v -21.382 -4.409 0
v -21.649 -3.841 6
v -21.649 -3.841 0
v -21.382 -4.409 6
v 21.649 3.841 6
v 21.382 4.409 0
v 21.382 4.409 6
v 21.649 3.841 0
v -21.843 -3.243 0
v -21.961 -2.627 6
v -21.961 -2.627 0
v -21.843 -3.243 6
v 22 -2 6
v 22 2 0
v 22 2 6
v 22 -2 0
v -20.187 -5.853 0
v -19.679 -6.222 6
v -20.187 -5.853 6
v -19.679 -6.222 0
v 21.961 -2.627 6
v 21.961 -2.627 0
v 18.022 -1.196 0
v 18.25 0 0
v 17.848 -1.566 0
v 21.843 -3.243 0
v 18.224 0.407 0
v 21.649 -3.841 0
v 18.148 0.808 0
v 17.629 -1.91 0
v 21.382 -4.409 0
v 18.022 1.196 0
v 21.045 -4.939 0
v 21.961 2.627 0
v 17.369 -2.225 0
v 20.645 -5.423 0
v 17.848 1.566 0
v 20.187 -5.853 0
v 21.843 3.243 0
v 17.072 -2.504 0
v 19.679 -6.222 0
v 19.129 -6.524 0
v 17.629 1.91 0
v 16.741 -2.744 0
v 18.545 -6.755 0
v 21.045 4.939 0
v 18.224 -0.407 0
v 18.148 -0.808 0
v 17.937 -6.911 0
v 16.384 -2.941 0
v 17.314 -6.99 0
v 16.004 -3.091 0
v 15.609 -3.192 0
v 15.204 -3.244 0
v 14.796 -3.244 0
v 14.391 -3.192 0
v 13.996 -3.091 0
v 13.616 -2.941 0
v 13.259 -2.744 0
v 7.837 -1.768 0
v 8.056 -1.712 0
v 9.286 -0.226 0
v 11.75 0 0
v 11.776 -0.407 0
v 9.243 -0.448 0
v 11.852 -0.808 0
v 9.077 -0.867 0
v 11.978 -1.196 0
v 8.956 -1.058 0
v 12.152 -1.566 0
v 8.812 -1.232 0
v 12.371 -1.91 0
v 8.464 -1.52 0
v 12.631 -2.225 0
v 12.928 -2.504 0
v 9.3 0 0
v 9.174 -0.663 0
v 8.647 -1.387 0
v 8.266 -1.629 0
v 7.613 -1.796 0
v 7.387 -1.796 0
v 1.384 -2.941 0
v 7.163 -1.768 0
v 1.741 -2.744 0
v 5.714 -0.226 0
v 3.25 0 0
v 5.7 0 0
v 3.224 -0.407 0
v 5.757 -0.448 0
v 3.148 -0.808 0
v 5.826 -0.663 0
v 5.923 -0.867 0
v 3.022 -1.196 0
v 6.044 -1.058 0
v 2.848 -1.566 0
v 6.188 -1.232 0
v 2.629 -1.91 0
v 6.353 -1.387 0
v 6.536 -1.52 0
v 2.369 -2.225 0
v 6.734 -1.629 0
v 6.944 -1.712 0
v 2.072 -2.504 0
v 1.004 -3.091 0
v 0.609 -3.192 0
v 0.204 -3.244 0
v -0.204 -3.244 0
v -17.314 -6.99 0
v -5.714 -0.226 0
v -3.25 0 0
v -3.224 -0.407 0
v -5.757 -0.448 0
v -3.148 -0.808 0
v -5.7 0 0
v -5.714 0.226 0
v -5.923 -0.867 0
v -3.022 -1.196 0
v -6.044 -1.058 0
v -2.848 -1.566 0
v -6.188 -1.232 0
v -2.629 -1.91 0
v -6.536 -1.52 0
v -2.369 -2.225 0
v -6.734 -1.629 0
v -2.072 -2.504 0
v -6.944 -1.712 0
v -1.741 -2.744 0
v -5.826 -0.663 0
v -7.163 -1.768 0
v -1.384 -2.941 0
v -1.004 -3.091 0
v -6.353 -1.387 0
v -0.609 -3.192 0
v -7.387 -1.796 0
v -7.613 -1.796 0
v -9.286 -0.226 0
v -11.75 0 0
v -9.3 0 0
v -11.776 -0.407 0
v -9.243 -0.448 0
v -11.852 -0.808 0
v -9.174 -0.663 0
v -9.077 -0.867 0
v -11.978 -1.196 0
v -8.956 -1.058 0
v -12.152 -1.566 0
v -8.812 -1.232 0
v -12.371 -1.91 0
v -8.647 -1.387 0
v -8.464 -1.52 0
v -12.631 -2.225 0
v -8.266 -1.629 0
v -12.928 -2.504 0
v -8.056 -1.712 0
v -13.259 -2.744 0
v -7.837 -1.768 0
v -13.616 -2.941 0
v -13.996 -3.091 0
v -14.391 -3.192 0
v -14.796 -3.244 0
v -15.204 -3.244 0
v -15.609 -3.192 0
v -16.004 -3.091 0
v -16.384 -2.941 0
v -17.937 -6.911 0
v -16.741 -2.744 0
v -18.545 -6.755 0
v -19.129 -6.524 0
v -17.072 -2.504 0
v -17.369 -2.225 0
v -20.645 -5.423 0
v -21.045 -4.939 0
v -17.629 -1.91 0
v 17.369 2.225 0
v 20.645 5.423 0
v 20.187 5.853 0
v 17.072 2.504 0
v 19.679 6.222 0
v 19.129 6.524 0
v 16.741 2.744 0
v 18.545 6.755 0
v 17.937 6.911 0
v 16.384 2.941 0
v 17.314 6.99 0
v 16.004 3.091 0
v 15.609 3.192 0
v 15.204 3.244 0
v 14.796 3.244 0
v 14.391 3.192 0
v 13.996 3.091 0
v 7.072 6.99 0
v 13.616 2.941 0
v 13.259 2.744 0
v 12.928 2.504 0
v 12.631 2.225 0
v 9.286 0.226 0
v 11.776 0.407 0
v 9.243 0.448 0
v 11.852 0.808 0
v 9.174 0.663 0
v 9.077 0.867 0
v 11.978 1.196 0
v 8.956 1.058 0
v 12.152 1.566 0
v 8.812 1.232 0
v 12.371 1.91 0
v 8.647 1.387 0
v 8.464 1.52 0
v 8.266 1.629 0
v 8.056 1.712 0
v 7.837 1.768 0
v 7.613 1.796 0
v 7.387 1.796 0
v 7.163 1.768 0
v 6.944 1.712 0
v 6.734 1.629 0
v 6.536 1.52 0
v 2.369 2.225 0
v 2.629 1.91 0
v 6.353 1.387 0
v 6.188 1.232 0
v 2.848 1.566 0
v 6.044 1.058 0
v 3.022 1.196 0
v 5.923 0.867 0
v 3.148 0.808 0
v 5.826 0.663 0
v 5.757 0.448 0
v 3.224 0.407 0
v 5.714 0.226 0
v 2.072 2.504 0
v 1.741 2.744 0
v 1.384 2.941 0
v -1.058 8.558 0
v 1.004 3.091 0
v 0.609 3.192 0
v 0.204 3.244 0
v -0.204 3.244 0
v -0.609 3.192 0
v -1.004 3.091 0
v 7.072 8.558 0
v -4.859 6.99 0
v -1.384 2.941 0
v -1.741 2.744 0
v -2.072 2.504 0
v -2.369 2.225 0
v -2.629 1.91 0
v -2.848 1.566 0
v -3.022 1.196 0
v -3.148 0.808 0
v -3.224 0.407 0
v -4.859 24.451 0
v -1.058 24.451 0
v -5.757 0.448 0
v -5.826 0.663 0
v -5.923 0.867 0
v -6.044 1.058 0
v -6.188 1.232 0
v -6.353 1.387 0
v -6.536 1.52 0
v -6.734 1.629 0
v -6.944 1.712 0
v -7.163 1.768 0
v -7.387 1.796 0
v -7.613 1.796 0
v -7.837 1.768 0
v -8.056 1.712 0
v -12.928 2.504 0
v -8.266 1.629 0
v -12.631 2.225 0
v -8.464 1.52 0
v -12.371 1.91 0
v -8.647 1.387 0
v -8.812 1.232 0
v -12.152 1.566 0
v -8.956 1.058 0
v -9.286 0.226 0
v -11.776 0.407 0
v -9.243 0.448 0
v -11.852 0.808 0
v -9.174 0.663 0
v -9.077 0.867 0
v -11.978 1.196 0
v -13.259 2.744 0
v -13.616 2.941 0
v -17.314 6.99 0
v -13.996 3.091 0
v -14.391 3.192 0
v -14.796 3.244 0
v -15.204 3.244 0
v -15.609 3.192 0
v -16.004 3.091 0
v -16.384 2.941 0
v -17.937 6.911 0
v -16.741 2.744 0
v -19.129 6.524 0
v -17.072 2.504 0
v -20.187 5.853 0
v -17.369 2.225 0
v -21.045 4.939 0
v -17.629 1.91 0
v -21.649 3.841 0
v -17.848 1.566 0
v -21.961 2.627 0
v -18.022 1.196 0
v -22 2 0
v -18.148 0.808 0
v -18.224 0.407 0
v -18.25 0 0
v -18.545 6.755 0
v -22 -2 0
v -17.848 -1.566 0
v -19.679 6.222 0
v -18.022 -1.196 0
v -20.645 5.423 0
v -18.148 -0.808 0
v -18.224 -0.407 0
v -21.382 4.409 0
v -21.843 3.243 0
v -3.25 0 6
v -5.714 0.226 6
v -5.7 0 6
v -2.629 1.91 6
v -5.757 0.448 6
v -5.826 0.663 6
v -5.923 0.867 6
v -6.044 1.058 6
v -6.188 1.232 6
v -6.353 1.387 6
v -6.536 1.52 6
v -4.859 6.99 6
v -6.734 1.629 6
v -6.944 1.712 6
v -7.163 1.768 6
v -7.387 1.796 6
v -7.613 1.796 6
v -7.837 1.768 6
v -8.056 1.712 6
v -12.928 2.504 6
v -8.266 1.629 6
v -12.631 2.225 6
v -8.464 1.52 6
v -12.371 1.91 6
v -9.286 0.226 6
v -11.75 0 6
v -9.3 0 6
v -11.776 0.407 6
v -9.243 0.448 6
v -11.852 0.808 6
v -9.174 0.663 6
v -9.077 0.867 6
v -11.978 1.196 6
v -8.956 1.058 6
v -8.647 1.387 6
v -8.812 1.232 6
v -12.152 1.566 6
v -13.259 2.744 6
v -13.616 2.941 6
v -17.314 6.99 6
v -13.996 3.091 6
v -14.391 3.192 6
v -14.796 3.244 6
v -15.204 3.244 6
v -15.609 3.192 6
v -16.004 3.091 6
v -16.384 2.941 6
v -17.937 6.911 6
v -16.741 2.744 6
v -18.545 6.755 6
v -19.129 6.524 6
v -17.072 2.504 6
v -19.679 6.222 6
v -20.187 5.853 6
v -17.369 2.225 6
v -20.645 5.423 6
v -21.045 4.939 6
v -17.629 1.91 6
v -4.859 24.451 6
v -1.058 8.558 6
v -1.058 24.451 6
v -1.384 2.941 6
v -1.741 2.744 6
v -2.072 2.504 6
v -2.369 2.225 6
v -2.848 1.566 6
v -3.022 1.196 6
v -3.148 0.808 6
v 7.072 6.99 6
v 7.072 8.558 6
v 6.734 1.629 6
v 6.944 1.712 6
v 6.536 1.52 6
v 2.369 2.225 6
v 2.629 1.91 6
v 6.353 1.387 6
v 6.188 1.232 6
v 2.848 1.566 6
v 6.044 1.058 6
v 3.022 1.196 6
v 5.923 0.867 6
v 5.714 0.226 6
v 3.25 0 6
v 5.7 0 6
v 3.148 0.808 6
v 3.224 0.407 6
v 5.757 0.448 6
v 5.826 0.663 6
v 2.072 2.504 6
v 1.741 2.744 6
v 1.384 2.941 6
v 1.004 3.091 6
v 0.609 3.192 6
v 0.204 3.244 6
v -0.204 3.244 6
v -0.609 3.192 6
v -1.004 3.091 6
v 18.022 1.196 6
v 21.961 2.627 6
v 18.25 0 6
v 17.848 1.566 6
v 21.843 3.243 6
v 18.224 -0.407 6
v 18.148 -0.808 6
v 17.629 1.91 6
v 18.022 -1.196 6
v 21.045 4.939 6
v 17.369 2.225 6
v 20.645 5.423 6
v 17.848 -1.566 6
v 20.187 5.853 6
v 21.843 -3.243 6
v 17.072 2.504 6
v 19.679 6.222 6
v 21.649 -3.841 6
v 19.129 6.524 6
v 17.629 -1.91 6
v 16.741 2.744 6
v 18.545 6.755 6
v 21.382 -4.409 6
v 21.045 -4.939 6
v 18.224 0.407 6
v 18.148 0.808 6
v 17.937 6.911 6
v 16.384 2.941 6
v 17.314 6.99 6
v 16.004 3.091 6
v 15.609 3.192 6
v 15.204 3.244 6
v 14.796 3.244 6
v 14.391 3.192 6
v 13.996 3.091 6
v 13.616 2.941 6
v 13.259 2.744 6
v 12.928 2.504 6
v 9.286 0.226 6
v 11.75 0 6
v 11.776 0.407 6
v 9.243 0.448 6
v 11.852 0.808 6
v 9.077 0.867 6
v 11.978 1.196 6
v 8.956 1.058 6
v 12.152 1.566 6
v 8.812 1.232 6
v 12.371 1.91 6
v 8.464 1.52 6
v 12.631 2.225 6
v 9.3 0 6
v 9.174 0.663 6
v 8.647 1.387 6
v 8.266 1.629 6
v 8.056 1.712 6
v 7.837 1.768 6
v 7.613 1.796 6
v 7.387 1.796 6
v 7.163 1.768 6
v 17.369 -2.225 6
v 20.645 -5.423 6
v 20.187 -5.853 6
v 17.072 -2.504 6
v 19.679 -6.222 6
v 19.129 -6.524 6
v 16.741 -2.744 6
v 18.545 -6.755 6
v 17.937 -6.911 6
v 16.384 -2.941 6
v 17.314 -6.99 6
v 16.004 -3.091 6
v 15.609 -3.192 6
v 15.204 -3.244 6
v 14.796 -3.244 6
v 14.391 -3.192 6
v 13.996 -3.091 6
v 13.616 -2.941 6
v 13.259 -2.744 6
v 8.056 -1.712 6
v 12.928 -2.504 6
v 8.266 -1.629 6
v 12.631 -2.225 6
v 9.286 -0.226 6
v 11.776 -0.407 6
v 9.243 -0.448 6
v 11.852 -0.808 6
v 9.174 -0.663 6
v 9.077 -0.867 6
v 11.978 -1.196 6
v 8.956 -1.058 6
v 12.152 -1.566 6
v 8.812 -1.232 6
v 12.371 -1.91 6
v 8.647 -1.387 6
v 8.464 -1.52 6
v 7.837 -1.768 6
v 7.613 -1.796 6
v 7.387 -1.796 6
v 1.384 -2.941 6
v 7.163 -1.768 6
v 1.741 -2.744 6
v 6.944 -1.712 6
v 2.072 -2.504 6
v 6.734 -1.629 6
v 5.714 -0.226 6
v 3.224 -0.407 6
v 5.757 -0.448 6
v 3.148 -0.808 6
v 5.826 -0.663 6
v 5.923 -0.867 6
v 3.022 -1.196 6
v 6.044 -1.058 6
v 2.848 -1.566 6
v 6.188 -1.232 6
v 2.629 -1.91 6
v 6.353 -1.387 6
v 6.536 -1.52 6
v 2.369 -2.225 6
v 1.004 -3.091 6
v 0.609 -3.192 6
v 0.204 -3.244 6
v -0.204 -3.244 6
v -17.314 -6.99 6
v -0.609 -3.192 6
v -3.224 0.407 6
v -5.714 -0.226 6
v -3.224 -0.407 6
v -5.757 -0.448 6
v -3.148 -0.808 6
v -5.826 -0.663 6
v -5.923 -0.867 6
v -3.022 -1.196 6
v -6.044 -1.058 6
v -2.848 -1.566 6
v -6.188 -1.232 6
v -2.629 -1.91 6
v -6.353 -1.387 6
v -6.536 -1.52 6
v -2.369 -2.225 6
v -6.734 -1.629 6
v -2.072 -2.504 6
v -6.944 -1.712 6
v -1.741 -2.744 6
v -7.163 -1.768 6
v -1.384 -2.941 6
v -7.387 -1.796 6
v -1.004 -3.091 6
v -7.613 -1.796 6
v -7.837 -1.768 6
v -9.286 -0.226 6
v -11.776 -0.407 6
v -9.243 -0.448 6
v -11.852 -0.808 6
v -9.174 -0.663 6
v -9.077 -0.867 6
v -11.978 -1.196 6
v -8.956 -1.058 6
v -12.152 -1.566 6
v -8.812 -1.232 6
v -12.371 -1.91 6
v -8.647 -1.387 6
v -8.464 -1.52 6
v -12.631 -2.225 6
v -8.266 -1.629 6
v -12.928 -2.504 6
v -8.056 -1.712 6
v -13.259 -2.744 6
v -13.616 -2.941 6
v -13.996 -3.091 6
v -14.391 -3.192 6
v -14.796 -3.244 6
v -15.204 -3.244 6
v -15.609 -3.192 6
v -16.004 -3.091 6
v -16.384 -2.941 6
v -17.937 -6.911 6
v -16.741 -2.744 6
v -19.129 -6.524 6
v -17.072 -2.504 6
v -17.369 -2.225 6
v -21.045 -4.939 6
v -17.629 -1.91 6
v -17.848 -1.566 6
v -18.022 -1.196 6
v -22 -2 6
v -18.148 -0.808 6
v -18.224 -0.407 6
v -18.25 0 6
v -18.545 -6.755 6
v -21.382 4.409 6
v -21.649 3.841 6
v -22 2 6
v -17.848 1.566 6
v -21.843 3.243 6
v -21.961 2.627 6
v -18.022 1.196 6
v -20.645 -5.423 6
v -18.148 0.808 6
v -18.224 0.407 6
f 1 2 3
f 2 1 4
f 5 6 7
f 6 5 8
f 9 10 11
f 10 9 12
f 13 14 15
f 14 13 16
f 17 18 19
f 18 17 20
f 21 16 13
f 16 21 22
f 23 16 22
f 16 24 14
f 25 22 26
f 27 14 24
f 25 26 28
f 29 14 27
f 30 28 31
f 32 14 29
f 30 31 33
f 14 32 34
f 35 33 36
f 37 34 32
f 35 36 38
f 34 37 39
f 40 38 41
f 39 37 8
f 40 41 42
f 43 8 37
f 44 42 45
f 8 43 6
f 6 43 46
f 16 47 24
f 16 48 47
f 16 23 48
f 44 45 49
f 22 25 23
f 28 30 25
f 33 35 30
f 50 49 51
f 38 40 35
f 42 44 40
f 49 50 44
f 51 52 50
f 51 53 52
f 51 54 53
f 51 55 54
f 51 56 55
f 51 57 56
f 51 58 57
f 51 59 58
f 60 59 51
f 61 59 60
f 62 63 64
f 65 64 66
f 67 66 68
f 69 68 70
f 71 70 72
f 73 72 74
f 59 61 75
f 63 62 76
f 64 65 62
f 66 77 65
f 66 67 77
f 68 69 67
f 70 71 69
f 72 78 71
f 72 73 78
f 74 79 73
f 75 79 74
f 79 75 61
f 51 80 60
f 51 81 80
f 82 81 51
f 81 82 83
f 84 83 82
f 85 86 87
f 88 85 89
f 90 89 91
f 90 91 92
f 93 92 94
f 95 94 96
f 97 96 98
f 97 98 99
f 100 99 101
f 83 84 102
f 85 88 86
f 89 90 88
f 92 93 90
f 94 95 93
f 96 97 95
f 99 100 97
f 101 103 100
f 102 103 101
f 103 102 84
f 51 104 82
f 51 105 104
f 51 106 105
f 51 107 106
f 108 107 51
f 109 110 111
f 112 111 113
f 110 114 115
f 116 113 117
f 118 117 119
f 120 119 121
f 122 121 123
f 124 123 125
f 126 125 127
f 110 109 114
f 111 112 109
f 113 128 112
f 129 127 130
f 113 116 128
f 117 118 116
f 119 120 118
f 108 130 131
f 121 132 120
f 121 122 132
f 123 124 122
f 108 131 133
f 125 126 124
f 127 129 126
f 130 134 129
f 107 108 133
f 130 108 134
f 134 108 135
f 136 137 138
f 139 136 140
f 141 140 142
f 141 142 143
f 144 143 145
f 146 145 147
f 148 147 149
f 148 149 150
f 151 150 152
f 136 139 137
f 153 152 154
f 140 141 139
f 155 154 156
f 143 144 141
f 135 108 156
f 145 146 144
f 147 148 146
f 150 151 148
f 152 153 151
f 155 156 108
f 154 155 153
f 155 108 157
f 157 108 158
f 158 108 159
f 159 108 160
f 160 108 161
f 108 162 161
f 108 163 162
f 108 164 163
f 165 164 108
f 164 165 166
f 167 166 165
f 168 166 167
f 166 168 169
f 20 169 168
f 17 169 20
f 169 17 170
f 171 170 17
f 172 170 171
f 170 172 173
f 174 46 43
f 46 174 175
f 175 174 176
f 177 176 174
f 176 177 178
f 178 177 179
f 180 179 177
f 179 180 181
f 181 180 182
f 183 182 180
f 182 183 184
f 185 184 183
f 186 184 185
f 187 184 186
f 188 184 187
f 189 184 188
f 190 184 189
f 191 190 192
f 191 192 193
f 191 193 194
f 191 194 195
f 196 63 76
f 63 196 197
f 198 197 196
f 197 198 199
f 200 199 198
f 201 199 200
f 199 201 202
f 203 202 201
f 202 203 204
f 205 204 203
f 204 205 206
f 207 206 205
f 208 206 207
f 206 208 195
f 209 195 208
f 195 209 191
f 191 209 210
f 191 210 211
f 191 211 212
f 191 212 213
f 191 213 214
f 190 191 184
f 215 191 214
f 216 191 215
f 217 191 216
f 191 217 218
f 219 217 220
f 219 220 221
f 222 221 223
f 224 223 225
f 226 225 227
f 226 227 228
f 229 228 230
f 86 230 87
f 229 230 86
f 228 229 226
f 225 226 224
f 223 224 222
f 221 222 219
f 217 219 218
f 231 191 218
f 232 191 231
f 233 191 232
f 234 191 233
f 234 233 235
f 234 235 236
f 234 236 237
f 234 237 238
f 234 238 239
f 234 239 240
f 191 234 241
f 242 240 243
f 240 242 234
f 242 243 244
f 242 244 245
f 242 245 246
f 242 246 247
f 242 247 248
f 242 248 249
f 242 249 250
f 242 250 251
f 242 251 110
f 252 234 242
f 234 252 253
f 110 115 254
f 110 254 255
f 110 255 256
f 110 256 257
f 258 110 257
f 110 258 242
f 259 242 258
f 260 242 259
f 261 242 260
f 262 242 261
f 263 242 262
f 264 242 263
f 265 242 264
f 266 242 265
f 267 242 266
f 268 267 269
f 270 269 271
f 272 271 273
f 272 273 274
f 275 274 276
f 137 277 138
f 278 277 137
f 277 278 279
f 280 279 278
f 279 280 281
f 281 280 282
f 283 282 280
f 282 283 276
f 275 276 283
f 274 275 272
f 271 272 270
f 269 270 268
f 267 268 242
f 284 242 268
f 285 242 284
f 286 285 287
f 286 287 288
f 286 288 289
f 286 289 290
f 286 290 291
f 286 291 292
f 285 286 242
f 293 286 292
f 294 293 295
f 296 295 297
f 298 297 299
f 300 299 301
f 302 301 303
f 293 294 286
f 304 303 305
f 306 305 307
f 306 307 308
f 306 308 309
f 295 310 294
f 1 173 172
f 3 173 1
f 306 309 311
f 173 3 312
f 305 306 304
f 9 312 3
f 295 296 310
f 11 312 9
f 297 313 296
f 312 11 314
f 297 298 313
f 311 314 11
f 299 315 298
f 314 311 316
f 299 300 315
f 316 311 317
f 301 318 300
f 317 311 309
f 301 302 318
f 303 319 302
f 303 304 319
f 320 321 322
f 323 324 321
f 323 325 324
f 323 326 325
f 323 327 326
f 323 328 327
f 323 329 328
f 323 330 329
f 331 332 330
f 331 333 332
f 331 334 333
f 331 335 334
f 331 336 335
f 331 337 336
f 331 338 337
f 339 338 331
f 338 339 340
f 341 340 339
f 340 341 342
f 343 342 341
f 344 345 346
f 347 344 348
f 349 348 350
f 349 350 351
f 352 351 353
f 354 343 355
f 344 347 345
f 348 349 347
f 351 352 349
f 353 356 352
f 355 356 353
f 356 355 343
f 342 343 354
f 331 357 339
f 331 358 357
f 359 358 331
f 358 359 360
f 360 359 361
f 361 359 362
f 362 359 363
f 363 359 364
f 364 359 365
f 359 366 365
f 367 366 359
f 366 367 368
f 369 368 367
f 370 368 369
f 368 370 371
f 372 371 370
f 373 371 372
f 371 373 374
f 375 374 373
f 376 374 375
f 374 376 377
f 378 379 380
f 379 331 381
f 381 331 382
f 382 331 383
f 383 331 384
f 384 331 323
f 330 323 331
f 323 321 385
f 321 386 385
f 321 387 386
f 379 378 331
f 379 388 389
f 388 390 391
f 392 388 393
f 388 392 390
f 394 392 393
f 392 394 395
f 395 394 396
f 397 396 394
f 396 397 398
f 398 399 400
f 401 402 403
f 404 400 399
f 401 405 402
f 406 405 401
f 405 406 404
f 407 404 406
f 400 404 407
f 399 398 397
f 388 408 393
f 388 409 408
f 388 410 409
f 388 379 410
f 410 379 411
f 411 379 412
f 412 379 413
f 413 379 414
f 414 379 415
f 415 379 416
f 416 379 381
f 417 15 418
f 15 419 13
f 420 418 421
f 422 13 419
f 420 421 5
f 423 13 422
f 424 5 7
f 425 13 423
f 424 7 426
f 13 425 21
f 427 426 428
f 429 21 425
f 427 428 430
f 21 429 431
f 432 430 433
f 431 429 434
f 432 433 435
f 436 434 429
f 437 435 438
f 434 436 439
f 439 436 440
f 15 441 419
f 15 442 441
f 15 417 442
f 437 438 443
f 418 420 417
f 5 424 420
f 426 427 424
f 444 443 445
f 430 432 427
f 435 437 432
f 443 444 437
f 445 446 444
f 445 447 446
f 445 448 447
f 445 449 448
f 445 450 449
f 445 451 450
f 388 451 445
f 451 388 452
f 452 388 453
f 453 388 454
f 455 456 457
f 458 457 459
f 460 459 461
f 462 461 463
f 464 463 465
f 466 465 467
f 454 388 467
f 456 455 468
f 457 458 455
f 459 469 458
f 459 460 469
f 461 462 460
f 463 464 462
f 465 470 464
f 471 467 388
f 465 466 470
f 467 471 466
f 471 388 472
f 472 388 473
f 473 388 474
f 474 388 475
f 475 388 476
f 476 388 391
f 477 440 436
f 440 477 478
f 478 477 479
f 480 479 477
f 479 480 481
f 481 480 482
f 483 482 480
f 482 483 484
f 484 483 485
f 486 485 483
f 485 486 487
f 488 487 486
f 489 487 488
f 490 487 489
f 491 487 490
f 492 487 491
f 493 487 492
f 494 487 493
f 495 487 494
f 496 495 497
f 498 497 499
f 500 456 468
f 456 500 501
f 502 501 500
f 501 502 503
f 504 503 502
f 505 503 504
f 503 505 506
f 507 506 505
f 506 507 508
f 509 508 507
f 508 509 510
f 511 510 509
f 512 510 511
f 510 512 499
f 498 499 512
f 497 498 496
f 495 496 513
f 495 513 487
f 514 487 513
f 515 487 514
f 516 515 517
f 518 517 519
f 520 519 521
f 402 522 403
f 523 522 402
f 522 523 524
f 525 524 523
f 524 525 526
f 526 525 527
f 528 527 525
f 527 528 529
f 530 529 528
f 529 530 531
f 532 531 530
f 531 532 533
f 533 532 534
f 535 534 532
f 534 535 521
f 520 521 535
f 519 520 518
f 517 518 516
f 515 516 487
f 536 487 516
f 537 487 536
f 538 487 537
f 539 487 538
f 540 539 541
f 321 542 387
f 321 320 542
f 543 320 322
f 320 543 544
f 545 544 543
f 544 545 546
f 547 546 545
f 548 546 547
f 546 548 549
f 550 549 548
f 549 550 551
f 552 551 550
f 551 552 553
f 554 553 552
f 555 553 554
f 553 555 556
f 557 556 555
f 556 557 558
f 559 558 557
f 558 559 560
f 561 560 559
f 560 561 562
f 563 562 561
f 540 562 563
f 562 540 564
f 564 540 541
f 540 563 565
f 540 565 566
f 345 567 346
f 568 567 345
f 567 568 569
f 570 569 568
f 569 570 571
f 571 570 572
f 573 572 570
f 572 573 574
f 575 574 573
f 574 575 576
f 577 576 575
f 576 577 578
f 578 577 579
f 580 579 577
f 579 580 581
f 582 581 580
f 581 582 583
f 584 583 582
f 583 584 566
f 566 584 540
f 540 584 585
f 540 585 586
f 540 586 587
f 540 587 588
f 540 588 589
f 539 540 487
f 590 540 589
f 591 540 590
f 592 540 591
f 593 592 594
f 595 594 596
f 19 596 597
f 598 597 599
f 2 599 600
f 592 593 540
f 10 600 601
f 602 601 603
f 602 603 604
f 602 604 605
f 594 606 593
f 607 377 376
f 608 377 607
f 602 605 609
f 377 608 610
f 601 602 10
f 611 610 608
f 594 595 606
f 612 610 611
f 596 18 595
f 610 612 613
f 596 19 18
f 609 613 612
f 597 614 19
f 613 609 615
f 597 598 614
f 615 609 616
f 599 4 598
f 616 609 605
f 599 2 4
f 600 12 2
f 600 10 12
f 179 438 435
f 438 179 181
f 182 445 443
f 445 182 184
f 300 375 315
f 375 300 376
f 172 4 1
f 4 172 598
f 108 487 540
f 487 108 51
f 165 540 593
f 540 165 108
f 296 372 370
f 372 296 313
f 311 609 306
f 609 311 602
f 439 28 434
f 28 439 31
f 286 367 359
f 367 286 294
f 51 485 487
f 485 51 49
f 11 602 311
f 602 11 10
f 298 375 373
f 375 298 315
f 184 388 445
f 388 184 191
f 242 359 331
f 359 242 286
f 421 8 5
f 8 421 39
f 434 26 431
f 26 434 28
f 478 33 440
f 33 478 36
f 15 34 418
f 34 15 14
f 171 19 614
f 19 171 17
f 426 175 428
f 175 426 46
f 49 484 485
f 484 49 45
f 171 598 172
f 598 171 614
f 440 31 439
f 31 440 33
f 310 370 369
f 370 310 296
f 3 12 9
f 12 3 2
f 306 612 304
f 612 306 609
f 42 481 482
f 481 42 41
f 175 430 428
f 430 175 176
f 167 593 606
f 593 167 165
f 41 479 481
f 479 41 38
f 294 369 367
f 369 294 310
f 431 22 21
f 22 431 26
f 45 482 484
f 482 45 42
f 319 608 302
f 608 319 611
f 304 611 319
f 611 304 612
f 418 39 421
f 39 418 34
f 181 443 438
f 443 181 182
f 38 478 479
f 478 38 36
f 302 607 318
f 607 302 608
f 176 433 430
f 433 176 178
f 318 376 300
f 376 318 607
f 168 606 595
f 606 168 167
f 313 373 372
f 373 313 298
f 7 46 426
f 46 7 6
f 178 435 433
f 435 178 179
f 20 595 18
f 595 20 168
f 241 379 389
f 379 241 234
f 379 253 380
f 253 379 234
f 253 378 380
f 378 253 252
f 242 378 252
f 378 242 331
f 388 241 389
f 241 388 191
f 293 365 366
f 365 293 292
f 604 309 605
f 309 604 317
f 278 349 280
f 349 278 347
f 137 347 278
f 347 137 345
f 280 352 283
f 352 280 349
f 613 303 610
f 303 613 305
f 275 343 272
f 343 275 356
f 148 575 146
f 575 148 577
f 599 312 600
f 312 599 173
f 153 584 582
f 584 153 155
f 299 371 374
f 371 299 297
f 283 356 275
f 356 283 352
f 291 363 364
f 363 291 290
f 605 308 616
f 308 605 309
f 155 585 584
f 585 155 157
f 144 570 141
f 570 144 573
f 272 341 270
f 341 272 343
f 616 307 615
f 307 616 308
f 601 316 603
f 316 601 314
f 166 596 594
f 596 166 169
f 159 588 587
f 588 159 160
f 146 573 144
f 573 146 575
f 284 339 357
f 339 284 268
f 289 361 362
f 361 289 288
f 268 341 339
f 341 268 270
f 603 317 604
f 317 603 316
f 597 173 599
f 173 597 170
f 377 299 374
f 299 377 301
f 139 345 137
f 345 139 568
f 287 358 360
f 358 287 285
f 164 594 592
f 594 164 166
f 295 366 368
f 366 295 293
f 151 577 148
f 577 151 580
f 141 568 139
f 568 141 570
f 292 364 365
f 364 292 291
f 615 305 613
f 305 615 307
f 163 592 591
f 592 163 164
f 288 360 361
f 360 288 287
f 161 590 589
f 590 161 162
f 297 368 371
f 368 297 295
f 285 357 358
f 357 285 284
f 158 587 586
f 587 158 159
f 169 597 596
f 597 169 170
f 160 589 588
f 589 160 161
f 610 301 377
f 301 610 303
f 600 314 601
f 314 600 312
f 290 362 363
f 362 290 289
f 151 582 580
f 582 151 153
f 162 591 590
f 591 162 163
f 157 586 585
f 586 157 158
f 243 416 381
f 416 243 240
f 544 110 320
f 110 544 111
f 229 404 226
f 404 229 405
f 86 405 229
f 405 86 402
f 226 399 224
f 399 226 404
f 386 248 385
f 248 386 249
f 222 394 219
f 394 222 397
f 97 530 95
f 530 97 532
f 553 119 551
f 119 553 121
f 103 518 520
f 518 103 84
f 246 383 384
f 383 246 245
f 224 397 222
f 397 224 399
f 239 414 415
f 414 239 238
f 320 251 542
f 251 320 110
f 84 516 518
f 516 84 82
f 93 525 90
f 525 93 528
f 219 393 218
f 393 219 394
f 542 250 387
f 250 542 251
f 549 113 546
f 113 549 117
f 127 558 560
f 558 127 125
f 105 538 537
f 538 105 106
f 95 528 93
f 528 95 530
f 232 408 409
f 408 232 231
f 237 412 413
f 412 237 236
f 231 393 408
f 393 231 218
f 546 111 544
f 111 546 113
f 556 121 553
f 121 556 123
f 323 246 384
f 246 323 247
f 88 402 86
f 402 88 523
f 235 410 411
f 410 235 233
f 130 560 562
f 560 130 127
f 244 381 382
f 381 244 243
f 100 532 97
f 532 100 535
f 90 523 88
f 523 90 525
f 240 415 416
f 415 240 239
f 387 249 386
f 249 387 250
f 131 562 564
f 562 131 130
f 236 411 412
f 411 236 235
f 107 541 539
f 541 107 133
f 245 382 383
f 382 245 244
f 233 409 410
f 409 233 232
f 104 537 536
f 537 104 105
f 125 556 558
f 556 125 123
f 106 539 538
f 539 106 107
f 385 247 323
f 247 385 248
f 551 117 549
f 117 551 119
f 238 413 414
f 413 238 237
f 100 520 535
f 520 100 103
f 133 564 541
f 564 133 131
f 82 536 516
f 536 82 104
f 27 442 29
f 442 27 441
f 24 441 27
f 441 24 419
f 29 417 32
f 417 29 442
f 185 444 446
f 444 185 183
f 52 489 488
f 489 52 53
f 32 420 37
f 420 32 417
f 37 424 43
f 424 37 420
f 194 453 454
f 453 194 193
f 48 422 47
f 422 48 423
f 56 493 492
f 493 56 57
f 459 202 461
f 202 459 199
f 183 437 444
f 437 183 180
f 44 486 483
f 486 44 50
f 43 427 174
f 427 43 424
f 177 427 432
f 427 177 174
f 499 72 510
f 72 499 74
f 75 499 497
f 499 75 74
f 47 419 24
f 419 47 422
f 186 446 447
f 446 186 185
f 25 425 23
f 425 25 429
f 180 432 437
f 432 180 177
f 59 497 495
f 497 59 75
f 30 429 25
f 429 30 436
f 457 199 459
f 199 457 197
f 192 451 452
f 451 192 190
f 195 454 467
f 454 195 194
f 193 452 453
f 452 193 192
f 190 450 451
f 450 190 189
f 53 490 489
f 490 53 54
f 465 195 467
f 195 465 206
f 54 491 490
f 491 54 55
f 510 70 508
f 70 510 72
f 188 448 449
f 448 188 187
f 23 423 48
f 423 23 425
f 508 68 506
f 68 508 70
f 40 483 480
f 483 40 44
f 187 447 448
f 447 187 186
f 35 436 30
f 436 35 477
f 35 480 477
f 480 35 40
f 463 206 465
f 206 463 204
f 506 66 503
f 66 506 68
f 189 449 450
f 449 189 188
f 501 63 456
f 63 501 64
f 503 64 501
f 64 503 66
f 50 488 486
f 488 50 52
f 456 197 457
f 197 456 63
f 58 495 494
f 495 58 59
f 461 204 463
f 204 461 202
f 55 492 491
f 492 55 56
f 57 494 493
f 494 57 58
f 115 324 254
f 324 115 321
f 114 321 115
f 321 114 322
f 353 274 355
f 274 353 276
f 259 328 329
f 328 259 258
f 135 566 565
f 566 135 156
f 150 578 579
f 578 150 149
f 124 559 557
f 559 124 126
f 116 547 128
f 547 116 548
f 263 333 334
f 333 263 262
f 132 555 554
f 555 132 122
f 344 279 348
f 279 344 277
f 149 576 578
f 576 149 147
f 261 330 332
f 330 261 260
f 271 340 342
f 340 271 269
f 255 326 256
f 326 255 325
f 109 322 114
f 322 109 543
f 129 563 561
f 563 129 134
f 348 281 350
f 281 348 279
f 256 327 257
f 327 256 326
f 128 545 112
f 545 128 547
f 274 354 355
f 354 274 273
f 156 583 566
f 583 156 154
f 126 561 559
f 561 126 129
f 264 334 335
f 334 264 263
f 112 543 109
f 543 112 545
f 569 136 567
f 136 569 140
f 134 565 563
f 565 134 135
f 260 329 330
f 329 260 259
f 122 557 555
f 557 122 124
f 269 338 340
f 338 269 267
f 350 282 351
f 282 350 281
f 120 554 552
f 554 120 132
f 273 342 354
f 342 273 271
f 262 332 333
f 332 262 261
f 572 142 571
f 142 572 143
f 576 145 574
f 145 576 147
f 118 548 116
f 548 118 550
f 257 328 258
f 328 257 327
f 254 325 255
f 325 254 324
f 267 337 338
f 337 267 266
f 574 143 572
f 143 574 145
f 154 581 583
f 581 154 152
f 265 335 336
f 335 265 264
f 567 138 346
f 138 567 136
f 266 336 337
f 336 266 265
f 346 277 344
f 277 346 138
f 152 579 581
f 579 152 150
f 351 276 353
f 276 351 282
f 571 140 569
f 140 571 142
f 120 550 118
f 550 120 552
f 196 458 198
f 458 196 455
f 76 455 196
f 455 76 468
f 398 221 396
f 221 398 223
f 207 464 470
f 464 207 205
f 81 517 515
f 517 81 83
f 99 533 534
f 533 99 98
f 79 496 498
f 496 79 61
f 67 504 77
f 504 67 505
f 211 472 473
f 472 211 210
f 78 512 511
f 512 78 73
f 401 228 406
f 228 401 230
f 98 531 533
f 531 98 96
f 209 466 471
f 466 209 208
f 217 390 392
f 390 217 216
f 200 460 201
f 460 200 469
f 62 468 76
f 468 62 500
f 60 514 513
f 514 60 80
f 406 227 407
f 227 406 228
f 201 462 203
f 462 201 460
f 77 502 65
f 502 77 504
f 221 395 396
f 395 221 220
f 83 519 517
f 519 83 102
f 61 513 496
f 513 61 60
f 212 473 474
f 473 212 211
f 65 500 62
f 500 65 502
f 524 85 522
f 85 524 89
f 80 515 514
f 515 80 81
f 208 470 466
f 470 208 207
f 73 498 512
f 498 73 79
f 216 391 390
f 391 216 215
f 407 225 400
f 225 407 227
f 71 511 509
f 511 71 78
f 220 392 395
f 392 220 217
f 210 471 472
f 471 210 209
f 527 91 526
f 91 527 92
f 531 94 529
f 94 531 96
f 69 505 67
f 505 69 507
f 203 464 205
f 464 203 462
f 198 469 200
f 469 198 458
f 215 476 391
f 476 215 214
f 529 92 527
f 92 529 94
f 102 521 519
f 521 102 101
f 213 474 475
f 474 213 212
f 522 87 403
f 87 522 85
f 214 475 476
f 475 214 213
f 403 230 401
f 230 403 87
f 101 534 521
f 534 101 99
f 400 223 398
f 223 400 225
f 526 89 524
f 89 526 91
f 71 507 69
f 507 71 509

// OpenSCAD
$fn = 50;


difference() {
	union() {
		hull() {
			translate(v = [-17.0000000000, 2.0000000000, 0]) {
				cylinder(h = 6, r = 5);
			}
			translate(v = [17.0000000000, 2.0000000000, 0]) {
				cylinder(h = 6, r = 5);
			}
			translate(v = [-17.0000000000, -2.0000000000, 0]) {
				cylinder(h = 6, r = 5);
			}
			translate(v = [17.0000000000, -2.0000000000, 0]) {
				cylinder(h = 6, r = 5);
			}
		}
		translate(v = [0, 24, 0]) {
			linear_extrude(height = 6) {
				text(font = "DejaVu Sans Mono:style=Bold", halign = "center", size = 19.0000000000, text = "L", valign = "top");
			}
		}
	}
	union() {
		translate(v = [-15.0000000000, 0.0000000000, 0]) {
			translate(v = [0, 0, -100]) {
				cylinder(h = 200, r = 3.2500000000);
			}
		}
		translate(v = [0, 0, -100]) {
			cylinder(h = 200, r = 3.2500000000);
		}
		translate(v = [15.0000000000, 0.0000000000, 0]) {
			translate(v = [0, 0, -100]) {
				cylinder(h = 200, r = 3.2500000000);
			}
		}
		translate(v = [-15.0000000000, 0.0000000000, 0]) {
			translate(v = [0, 0, -100]) {
				cylinder(h = 200, r = 1.8000000000);
			}
		}
		translate(v = [-7.5000000000, 0.0000000000, 0]) {
			translate(v = [0, 0, -100]) {
				cylinder(h = 200, r = 1.8000000000);
			}
		}
		translate(v = [0, 0, -100]) {
			cylinder(h = 200, r = 1.8000000000);
		}
		translate(v = [7.5000000000, 0.0000000000, 0]) {
			translate(v = [0, 0, -100]) {
				cylinder(h = 200, r = 1.8000000000);
			}
		}
		translate(v = [15.0000000000, 0.0000000000, 0]) {
			translate(v = [0, 0, -100]) {
				cylinder(h = 200, r = 1.8000000000);
			}
		}
	}
}
